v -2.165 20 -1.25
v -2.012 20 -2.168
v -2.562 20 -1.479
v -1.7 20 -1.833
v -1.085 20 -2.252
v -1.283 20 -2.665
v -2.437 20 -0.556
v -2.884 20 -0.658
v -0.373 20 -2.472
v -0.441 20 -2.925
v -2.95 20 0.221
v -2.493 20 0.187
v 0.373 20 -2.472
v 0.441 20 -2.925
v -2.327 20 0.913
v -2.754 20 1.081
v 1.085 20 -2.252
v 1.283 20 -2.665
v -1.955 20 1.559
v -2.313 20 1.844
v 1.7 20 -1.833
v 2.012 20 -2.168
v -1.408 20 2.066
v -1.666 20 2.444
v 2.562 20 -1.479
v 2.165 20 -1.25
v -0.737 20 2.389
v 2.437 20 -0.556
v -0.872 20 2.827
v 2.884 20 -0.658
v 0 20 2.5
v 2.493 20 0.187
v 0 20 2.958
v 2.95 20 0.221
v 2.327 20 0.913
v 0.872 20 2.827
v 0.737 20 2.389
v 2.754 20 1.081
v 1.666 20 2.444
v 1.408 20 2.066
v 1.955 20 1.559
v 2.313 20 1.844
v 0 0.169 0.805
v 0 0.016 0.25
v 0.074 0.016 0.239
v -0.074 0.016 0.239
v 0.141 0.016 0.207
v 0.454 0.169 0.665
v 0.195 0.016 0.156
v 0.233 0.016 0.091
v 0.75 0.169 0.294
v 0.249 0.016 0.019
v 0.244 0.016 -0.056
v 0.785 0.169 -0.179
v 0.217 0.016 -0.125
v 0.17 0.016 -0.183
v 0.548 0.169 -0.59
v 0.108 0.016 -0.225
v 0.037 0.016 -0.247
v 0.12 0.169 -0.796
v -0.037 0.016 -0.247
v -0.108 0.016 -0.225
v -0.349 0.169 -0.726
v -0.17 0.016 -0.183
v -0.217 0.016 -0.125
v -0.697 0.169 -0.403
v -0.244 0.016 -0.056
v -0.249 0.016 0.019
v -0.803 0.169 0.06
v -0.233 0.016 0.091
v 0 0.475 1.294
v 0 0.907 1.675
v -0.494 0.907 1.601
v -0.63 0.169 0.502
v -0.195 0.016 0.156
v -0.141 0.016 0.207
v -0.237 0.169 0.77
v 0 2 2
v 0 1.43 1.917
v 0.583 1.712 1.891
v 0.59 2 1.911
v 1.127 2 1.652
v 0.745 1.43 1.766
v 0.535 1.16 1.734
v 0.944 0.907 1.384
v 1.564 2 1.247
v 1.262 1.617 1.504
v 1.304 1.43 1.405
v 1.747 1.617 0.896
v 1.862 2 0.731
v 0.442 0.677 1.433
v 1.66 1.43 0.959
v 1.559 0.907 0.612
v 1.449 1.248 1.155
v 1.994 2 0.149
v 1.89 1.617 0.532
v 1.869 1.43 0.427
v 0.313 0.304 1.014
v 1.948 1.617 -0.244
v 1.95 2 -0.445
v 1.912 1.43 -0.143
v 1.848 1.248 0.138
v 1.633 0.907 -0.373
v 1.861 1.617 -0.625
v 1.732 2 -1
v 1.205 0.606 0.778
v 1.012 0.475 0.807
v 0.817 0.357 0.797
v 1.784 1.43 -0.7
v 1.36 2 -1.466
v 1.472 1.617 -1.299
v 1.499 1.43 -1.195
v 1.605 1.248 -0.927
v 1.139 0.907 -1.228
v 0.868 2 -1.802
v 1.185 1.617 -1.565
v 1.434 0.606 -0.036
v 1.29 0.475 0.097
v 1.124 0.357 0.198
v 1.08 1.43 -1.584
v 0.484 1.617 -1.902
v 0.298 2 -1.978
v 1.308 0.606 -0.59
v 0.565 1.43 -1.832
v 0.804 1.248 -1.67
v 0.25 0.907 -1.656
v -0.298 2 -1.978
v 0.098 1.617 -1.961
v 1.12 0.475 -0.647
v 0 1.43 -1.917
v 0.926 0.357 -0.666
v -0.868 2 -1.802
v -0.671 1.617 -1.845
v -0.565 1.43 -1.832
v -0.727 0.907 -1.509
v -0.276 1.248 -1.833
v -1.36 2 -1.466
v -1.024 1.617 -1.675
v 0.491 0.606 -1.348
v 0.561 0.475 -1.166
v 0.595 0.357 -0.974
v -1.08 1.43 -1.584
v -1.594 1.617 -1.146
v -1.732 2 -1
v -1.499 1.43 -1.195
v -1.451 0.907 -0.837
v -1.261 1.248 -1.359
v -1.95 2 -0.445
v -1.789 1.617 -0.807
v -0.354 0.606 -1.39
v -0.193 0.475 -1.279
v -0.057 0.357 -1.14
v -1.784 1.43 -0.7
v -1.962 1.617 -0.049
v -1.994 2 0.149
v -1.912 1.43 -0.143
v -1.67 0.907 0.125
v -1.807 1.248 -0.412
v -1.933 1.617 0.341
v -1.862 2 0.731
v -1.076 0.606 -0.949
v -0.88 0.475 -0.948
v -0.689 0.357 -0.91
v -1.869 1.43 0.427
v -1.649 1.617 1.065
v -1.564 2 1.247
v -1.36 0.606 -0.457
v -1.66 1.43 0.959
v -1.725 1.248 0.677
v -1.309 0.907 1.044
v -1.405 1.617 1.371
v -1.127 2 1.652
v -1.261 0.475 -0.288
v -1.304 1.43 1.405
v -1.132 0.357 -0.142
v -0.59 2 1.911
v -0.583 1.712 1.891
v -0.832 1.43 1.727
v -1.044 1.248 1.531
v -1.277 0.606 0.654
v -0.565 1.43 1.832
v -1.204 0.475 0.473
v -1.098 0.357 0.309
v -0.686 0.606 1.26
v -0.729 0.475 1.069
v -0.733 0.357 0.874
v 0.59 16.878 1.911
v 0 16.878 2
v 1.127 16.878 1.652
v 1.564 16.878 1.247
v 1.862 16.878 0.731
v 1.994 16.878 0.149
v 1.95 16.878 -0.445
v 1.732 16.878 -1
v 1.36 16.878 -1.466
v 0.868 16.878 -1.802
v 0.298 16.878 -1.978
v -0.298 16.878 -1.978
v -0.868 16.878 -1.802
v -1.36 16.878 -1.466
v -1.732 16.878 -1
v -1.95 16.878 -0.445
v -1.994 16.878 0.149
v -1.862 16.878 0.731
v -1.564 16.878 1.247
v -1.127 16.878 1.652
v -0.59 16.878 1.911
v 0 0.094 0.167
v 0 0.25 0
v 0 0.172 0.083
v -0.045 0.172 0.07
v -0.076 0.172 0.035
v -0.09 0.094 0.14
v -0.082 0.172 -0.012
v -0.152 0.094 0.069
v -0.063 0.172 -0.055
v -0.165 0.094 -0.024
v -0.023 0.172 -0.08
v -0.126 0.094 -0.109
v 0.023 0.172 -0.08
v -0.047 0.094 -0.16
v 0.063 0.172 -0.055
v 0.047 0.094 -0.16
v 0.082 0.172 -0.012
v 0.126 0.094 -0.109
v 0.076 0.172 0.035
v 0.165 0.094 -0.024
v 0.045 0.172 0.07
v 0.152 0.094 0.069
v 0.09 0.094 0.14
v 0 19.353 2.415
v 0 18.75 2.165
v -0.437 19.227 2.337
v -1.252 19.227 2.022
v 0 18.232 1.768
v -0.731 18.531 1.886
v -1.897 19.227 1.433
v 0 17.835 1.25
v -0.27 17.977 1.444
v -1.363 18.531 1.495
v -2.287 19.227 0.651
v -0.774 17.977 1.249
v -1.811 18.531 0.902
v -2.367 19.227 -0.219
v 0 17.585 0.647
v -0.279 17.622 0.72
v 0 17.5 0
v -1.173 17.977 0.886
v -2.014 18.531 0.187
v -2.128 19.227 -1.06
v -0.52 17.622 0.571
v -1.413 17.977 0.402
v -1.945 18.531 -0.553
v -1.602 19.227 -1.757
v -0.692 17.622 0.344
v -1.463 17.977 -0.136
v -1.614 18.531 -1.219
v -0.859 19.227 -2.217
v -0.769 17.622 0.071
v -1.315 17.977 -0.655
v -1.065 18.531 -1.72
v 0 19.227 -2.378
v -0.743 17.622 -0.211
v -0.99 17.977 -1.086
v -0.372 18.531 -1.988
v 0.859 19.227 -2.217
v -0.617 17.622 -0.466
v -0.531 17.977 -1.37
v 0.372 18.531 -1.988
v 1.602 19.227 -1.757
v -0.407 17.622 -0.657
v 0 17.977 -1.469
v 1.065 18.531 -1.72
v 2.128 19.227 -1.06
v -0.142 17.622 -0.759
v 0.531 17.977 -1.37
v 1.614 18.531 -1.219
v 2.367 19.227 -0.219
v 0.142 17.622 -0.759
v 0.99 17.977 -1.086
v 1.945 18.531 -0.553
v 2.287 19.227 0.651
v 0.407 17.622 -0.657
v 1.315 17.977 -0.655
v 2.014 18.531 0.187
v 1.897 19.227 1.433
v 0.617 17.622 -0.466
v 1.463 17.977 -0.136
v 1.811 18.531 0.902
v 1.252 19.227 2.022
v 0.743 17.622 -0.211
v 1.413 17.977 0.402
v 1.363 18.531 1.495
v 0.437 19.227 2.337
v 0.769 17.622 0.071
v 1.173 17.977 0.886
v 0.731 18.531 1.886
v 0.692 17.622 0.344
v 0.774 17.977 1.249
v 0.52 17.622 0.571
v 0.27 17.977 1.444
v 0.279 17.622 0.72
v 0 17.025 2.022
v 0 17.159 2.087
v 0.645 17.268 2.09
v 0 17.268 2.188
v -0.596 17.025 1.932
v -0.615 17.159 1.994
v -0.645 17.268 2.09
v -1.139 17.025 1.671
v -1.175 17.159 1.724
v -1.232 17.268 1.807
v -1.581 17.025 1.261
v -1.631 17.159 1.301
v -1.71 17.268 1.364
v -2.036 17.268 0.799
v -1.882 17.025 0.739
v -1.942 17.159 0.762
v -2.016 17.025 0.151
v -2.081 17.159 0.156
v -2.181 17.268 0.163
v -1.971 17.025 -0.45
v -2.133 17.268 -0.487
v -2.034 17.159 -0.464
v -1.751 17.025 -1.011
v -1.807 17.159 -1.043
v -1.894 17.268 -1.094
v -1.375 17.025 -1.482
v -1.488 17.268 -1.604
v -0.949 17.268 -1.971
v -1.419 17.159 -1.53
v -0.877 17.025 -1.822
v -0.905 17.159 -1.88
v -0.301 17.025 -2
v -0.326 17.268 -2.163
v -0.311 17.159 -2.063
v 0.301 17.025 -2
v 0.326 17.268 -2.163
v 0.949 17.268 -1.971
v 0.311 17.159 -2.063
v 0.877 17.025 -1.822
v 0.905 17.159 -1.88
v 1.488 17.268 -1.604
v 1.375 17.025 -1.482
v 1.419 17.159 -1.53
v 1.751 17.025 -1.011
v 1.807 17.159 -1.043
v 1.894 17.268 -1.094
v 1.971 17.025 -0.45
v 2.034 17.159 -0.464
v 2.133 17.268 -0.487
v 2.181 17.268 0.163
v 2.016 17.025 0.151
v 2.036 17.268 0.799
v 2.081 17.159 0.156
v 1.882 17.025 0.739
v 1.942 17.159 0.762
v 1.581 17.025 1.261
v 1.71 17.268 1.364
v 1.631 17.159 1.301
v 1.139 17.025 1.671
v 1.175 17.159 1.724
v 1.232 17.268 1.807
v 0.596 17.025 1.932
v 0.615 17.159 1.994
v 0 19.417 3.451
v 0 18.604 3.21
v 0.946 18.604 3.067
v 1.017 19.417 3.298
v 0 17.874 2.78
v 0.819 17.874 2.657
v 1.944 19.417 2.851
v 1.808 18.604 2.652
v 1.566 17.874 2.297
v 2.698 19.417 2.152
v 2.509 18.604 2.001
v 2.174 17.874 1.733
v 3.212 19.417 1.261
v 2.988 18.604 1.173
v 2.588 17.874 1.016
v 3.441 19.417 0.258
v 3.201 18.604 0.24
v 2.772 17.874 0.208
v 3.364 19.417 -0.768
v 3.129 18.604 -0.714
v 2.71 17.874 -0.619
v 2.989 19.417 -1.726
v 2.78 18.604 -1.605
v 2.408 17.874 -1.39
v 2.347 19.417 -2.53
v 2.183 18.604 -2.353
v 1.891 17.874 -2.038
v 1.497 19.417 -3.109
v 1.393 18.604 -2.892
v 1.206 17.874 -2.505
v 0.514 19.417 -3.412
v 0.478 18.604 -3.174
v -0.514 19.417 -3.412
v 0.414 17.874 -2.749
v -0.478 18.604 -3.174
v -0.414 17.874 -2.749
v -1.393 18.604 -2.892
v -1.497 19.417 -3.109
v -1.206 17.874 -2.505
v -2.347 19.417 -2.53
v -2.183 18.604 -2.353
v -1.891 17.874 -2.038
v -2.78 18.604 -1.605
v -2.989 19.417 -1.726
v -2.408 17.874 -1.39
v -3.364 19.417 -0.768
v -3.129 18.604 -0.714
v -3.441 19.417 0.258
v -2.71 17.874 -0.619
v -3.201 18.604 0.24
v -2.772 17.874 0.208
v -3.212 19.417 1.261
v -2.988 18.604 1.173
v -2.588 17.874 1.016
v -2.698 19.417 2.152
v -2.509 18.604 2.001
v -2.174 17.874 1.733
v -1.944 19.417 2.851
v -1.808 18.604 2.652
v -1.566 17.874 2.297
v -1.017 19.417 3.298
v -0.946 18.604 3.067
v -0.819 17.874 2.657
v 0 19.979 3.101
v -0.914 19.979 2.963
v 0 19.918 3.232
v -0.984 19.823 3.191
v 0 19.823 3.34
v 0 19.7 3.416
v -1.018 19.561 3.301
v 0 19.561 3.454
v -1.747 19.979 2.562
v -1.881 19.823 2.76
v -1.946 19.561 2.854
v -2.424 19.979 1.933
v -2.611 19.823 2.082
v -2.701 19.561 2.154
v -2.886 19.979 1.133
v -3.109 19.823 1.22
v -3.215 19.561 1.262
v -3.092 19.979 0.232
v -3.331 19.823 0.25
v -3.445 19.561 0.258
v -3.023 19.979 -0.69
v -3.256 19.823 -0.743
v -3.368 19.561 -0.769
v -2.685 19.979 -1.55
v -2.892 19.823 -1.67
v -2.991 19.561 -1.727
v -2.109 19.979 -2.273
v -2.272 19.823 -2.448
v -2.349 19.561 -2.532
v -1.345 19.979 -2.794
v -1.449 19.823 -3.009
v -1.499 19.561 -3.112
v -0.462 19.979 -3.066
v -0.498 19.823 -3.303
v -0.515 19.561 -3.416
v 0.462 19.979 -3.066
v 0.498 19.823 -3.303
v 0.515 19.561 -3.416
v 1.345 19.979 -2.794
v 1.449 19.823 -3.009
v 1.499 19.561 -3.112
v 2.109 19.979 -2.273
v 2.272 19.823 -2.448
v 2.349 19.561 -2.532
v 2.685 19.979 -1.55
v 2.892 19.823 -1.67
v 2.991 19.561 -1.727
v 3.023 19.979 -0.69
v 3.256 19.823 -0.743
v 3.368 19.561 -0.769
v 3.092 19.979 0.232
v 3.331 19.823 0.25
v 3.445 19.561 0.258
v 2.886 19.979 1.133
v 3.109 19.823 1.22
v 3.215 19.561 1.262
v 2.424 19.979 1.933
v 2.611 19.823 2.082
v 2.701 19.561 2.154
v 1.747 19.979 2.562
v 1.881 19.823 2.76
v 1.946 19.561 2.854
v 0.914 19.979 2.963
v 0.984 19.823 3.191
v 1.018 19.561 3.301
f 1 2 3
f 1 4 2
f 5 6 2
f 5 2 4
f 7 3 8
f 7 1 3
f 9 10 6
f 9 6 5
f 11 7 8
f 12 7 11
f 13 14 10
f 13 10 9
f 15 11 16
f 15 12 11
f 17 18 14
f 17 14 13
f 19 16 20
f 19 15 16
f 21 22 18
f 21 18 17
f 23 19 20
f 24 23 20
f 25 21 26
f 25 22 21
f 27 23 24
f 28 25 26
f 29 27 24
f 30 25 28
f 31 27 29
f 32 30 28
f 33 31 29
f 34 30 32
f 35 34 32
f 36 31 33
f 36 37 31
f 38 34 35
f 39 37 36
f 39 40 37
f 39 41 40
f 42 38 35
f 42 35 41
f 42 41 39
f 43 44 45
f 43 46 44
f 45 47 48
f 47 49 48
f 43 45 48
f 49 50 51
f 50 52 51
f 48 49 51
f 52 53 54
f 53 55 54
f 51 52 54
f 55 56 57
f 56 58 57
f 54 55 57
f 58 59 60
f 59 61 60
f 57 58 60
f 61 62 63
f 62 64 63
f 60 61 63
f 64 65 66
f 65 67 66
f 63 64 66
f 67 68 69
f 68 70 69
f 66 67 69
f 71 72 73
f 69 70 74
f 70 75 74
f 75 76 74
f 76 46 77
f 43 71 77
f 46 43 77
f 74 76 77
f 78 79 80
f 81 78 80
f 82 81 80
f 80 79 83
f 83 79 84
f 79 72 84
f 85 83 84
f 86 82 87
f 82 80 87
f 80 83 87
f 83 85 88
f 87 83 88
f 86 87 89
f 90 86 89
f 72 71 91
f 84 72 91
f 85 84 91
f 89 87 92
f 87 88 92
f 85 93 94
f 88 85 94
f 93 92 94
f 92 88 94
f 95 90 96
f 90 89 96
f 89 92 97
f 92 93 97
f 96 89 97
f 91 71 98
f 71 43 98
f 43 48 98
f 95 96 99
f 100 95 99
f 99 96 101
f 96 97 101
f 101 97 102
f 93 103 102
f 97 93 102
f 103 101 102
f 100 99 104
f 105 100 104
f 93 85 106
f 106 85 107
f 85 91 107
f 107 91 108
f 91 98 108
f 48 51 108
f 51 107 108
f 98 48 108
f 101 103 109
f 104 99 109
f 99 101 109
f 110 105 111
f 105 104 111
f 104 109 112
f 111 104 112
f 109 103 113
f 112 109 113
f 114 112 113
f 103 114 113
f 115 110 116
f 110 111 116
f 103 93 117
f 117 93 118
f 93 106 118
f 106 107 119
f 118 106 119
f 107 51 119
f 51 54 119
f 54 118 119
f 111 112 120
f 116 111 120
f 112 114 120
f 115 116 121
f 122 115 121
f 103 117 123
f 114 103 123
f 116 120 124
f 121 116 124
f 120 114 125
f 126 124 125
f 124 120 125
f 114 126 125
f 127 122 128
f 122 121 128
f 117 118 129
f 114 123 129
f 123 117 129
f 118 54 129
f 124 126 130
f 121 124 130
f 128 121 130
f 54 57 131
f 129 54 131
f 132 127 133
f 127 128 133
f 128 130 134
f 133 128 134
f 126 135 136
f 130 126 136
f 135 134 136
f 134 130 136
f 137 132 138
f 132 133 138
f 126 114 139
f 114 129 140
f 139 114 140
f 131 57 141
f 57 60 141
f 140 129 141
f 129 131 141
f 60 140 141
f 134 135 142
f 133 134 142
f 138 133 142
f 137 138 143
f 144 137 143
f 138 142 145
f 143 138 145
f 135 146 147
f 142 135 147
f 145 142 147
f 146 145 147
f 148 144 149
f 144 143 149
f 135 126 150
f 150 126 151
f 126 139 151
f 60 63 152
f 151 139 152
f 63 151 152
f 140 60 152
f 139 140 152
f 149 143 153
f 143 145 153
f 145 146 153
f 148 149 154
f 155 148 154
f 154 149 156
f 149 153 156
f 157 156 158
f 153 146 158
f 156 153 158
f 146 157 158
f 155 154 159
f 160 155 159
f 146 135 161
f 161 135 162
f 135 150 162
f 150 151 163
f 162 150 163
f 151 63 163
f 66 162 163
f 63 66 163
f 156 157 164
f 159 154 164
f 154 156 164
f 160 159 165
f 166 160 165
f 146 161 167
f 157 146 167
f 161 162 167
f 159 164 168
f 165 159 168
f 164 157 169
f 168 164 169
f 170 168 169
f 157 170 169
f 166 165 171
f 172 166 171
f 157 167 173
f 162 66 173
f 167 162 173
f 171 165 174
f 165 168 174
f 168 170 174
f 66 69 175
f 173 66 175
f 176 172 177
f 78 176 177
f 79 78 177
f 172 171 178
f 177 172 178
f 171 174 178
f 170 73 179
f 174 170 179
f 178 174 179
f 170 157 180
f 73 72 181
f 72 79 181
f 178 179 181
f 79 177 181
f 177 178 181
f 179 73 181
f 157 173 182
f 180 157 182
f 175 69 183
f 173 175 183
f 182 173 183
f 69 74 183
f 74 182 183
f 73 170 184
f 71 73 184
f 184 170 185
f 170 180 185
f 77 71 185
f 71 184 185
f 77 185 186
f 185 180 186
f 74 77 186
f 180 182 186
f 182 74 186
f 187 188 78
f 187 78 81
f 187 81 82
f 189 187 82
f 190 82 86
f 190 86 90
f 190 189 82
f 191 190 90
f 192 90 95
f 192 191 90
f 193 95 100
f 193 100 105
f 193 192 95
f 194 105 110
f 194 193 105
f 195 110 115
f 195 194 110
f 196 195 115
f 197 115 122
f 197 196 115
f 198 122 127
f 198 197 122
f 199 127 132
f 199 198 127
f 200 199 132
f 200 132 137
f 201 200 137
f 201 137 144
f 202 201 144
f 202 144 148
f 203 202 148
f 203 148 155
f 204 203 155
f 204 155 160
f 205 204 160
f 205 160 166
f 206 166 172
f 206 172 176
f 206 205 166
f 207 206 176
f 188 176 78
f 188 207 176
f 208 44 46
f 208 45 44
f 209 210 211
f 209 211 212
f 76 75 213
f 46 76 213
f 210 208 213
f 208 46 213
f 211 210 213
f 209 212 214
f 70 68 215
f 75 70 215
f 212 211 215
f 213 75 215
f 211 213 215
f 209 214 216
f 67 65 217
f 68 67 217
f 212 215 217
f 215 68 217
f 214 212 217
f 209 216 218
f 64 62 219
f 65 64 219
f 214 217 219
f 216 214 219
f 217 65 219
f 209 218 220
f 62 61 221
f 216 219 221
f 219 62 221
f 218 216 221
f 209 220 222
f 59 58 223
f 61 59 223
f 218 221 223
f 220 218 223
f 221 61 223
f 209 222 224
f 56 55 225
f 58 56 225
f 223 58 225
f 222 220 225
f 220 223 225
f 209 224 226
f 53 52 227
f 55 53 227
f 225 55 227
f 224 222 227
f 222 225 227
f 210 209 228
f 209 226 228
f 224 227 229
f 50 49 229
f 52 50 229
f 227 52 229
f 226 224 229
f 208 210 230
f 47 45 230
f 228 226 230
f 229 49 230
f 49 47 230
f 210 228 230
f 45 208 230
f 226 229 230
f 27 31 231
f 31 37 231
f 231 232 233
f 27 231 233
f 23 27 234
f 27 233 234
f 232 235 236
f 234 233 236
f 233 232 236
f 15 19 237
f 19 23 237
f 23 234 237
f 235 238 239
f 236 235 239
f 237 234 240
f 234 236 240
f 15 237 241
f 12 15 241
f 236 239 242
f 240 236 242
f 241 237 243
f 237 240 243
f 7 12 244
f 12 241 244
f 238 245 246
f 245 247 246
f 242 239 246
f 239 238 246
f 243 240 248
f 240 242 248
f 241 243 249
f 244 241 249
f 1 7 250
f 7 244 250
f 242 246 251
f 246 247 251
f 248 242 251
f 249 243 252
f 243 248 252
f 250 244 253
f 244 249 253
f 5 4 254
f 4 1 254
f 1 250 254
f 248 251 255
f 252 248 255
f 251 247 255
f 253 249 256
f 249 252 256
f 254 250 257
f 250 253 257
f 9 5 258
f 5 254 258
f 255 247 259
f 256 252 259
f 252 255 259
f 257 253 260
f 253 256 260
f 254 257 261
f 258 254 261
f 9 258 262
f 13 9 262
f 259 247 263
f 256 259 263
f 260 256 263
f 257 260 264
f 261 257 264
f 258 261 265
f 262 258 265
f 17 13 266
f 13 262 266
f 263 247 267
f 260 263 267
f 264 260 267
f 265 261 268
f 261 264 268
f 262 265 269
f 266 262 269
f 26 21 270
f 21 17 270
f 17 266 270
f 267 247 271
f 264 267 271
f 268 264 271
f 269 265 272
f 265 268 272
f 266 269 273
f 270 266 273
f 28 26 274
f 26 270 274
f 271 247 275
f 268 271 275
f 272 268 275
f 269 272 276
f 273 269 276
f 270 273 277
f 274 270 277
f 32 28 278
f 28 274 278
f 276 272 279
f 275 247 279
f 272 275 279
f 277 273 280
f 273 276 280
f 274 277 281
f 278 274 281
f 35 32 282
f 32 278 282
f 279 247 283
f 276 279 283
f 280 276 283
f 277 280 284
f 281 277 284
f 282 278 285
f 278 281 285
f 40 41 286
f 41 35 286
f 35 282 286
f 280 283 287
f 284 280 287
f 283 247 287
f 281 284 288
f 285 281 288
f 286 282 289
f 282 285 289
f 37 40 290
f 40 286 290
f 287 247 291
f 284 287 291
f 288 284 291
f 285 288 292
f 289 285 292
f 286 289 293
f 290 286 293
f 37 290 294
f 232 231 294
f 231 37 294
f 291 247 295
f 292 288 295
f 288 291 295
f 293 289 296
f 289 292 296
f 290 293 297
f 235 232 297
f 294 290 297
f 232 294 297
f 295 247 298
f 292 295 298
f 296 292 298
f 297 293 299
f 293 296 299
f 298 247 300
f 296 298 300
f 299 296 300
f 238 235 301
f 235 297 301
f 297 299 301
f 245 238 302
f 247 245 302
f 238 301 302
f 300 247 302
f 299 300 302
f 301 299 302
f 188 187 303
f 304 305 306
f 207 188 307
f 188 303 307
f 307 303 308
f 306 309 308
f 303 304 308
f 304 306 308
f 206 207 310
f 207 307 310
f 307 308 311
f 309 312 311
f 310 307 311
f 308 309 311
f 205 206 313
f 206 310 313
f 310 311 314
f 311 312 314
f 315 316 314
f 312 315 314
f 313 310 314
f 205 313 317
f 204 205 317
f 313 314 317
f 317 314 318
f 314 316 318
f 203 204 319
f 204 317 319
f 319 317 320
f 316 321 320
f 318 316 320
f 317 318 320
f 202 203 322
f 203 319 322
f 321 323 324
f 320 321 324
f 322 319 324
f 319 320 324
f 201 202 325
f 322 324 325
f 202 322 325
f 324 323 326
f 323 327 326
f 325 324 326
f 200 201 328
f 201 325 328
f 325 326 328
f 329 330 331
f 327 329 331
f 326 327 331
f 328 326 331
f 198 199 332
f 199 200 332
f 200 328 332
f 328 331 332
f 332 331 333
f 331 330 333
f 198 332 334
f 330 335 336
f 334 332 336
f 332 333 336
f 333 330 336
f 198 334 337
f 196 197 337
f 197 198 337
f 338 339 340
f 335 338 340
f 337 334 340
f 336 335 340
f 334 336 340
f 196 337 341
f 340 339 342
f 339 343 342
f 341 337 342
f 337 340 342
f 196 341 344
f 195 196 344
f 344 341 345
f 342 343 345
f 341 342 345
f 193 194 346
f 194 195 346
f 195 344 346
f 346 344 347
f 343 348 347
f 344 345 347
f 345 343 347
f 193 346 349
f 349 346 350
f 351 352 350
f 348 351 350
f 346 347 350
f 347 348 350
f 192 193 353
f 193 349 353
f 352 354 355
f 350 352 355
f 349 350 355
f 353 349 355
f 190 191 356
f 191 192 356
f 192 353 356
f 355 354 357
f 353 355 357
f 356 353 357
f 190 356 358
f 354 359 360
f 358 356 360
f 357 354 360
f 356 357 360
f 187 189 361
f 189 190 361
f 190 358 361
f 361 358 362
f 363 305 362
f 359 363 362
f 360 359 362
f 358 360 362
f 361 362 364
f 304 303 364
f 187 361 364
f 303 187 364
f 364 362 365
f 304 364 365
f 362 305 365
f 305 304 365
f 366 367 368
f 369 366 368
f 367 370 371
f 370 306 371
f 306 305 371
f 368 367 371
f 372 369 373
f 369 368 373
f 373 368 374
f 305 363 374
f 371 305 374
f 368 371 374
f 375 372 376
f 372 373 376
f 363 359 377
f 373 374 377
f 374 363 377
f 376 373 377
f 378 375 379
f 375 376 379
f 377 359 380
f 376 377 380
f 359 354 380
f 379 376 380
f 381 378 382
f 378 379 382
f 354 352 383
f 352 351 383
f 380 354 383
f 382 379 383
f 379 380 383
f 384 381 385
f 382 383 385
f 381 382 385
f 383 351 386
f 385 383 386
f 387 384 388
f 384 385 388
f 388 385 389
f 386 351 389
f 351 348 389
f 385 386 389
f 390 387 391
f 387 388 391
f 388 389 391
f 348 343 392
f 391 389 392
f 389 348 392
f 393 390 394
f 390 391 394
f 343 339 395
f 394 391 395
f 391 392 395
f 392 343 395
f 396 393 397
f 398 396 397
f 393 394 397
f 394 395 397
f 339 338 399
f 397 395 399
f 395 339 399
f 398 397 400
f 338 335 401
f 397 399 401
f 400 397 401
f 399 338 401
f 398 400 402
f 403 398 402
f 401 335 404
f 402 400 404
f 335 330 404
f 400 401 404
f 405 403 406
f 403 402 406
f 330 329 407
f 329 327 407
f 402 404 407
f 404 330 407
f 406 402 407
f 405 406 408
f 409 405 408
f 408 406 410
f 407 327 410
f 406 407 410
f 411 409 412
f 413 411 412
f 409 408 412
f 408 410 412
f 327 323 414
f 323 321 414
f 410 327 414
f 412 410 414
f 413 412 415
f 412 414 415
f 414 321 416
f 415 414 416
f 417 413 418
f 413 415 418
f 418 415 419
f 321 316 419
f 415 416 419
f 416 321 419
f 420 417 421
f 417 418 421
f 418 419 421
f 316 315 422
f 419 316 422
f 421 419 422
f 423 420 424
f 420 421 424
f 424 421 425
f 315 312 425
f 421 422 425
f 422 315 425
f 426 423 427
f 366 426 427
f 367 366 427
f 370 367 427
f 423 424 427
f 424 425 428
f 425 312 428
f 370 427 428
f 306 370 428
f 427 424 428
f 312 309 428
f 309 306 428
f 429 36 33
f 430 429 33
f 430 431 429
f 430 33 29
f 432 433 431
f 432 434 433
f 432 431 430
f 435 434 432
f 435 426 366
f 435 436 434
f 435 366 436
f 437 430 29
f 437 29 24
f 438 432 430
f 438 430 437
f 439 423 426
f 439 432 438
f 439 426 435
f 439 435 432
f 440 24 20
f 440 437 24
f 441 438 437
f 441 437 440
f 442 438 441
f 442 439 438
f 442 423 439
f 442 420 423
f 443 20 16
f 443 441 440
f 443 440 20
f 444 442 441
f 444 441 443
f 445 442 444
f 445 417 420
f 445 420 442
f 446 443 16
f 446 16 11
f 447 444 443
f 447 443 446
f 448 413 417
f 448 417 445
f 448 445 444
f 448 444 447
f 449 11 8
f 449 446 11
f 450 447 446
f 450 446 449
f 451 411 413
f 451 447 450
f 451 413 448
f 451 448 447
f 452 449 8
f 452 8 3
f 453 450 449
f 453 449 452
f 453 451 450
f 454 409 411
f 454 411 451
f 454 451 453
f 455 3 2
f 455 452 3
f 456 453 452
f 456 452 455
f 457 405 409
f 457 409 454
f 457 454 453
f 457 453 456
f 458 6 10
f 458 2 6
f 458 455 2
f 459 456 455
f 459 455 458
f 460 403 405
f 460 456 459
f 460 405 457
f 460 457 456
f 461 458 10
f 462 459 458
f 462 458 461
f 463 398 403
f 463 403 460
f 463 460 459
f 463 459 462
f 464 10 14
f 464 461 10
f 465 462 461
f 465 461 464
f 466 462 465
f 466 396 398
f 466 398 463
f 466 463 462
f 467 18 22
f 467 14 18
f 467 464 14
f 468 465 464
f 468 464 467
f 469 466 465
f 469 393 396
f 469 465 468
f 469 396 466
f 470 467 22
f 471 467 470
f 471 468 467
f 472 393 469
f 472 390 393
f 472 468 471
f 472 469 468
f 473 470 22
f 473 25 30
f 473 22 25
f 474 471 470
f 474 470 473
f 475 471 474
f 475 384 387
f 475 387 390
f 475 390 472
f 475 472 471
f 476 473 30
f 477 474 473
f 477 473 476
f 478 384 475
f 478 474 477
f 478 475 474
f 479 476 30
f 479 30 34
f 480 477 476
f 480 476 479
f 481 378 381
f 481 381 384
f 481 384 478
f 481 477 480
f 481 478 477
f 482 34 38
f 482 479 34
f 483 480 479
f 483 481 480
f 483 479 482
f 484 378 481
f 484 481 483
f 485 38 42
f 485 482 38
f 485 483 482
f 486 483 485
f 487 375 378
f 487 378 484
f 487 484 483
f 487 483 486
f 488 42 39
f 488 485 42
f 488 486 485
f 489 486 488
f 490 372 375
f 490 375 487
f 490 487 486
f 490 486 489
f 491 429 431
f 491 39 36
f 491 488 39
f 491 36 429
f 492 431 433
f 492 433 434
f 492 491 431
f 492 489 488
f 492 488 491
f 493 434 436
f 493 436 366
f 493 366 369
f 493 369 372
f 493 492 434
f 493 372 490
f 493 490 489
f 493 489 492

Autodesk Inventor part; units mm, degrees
ref_plane "YZ Plane" through (0, 0, 0) normal (1, 0, 0) x (0, 1, 0)
ref_plane "XZ Plane" through (0, 0, 0) normal (0, 1, 0) x (-1, 0, 0)
ref_plane "XY Plane" through (0, 0, 0) normal (0, 0, 1) x (1, 0, 0)
sketch "Sketch1" plane through (0, 0, 0) normal (1, 0, 0) x (0, 1, 0)
  line L0 (0, 0) -> (20, 0) construction
  arc A0 (20, 2.5) -> (17.5, 0) centre (20, 0) ccw
  arc A1 (19.4167, 3.451) -> (17.2678, 2.1875) centre (20, 0) ccw
  line L1 (2, 2) -> (16.8775, 2)
  line L2 (2, 2) -> (2, -2.5) construction
  arc A2 (2, 2) -> (0.0157, 0.25) centre (2, 0) ccw
  line L3 (0.25, 0) -> (0.0157, 0.25)
  line L4 (20, 0) -> (20, 2.958)
  line L5 (17.5, 0) -> (0.25, 0)
  arc A3 (20, 2.958) -> (19.4167, 3.451) centre (19.5, 2.958) ccw
  arc A4 (16.8775, 2) -> (17.2678, 2.1875) centre (16.8775, 2.5) ccw
  dimension "d0" = 20
  dimension "d1" = 5
  dimension "d2" = 7
  dimension "d3" = 2
  dimension "d4" = 2
  dimension "d5" = 0.25
  dimension "d6" = 0.25
  dimension "d7" = 1
  dimension "d8" = 1
revolve "Revolution1" add sketch "Sketch1" angle 360 about axis through (0, 0, 0) along (0, 1, 0)
properties part number "Component 4 (Pound)"
